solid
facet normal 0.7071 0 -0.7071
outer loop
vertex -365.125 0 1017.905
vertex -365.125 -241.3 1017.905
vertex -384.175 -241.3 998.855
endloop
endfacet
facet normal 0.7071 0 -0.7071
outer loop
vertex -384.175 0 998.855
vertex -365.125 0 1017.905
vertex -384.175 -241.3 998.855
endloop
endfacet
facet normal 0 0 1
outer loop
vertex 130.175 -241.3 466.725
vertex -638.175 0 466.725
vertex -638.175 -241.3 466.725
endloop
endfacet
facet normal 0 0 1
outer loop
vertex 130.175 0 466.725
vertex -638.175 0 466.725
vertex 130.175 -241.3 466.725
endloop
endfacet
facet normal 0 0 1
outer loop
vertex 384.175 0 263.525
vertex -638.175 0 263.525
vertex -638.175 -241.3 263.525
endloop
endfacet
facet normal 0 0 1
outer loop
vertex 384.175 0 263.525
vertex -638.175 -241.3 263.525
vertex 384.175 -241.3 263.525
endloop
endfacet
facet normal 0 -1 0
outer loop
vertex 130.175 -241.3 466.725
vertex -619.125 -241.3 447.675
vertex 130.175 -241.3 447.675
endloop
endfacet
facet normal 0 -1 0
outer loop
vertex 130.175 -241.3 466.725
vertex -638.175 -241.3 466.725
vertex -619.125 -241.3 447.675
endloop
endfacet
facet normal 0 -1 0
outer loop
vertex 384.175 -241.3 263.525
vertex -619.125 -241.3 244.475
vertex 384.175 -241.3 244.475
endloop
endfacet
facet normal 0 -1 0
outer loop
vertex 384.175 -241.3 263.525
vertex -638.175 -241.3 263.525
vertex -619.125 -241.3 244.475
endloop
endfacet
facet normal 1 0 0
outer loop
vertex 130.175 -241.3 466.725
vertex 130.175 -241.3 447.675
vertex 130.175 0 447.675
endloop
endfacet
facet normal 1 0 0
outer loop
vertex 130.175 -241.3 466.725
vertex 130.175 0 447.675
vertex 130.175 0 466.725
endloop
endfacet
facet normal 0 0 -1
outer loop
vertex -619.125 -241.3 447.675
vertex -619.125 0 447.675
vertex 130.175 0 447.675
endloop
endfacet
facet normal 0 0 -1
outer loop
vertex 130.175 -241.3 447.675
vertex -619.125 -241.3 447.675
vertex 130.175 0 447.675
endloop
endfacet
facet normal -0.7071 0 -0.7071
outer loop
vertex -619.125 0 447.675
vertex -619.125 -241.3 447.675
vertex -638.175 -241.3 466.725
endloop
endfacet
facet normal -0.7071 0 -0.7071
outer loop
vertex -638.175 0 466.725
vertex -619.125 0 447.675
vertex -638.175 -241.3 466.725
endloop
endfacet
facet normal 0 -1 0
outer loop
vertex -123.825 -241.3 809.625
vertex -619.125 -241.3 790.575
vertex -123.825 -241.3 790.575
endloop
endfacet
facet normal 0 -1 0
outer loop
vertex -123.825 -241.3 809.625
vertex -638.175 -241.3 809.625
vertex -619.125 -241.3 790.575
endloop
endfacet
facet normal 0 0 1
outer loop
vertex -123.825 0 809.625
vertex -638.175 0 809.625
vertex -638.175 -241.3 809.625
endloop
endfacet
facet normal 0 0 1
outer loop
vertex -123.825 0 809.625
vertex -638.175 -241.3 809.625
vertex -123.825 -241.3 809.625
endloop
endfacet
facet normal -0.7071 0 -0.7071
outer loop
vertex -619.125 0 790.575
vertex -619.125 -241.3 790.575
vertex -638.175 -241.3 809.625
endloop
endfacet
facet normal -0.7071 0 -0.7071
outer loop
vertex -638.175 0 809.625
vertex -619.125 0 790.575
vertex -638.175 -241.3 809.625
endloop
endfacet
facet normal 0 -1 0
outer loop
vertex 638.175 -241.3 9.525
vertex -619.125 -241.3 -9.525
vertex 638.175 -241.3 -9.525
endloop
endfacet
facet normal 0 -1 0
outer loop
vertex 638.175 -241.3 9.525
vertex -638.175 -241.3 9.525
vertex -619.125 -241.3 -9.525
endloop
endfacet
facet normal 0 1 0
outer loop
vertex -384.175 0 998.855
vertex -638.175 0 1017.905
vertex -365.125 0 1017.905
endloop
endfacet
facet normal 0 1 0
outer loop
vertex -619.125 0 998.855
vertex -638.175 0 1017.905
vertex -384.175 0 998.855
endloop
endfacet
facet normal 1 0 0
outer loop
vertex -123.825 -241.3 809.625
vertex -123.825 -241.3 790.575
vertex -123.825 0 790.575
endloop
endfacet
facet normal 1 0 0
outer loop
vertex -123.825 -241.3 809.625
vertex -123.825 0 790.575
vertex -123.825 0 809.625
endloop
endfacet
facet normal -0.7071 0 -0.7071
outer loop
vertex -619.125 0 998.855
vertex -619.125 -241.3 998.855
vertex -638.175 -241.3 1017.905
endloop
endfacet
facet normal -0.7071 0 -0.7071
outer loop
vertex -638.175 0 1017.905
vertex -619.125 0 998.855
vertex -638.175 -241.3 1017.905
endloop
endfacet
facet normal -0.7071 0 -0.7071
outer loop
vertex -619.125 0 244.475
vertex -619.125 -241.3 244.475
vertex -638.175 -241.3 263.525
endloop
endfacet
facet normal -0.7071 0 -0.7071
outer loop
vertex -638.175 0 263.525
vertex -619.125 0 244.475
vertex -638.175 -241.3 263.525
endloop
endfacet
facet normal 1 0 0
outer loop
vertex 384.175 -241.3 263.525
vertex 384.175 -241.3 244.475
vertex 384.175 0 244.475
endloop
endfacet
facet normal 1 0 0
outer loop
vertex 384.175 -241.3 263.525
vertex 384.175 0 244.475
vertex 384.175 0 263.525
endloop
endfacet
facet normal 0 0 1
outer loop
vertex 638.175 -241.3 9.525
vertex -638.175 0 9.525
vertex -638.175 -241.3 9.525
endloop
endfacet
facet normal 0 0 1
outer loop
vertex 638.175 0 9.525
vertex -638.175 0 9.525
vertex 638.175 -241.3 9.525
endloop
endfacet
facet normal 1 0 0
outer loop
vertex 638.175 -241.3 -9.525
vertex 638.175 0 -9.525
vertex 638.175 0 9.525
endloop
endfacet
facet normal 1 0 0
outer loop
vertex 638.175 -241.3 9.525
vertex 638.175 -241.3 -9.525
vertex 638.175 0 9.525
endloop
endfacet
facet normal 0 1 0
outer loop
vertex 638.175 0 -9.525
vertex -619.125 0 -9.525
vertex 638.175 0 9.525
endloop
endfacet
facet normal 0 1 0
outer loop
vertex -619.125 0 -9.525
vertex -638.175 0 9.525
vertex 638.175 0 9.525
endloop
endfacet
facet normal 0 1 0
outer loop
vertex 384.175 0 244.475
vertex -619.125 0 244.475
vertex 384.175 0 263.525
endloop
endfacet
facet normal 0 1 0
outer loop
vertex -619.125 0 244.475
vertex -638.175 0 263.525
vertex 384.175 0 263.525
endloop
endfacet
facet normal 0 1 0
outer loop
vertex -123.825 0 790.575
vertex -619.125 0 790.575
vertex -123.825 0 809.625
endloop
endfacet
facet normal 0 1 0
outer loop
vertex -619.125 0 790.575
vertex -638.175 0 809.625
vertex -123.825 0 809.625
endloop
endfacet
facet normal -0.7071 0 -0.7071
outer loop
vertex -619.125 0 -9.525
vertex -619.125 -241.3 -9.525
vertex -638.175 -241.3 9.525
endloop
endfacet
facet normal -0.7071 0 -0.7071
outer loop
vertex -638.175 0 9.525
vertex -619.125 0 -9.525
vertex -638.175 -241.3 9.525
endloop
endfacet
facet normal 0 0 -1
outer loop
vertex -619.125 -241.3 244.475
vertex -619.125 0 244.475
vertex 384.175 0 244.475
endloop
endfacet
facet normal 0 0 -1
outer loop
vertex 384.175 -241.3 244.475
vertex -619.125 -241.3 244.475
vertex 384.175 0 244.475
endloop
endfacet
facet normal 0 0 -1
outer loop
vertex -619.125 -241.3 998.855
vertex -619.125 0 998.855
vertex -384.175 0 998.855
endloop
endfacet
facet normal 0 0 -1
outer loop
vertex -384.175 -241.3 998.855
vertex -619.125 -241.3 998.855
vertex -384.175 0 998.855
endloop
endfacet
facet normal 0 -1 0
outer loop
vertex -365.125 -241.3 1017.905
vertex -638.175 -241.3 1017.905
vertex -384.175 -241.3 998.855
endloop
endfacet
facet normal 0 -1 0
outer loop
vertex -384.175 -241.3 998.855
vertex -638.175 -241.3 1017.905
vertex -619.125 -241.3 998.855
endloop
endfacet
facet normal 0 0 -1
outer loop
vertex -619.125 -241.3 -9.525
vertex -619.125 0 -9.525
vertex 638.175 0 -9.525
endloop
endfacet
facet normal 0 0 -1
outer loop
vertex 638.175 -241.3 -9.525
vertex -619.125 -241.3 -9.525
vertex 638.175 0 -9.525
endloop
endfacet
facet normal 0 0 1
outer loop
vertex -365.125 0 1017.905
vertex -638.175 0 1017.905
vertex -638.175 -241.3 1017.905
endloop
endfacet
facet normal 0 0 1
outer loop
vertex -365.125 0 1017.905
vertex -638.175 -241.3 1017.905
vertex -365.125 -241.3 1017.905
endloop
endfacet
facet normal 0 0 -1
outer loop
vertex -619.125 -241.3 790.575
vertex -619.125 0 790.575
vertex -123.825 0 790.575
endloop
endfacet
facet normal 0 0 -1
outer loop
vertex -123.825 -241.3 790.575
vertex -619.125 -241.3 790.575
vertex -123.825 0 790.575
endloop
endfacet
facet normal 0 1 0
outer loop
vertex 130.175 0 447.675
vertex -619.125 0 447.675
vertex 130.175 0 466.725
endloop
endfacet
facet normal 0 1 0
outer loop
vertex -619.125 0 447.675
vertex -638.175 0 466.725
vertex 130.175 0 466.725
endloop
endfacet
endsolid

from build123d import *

# Parameters (mm, degrees)
F0_W      = 1276.35
F0_H      = 19.05
F1_DEPTH  = 241.3
F3_DEPTH  = 241.301
F5_W      = 254
F5_H      = 19.05
F6_DEPTH  = 241.301
F8_W      = 254
F8_H      = 19.05
F9_DEPTH  = 241.301
F11_W     = 254
F11_H     = 19.05
F12_DEPTH = 241.301
F15_DEPTH = 241.301


with BuildPart() as f1:
    # F0 (on Front) → F1 (new body)
    with BuildSketch(Plane.XZ):
        Rectangle(F0_W, F0_H)
    extrude(amount=F1_DEPTH)

    # F2 (on face) → F3 (cut, through all)
    with BuildSketch(Plane.XZ.offset(241.3)):
        Polygon((-619.125, -9.525), (-638.175, 9.525), (-638.175, -9.525), align=None)
    extrude(amount=-F3_DEPTH, mode=Mode.SUBTRACT)


with BuildPart() as f4_1:
    # F4: copy of F1
    add(f1.part.moved(Location((0, 0, 254))))

    # F5 (on face) → F6 (cut, through all)
    with BuildSketch(Plane.XZ.offset(241.3)):
        with Locations((511.175, 254)):
            Rectangle(F5_W, F5_H)
    extrude(amount=-F6_DEPTH, mode=Mode.SUBTRACT)


with BuildPart() as f7_1:
    # F7: copy of F4_1
    add(f4_1.part.moved(Location((0, 0, 203.2))))

    # F8 (on face) → F9 (cut, through all)
    with BuildSketch(Plane.XZ.offset(241.3)):
        with Locations((257.175, 457.2)):
            Rectangle(F8_W, F8_H)
    extrude(amount=-F9_DEPTH, mode=Mode.SUBTRACT)


with BuildPart() as f10_1:
    # F10: copy of F7_1
    add(f7_1.part.moved(Location((0, 0, 342.9))))

    # F11 (on face) → F12 (cut, through all)
    with BuildSketch(Plane.XZ.offset(241.3)):
        with Locations((3.175, 800.1)):
            Rectangle(F11_W, F11_H)
    extrude(amount=-F12_DEPTH, mode=Mode.SUBTRACT)


with BuildPart() as f13_1:
    # F13: copy of F10_1
    add(f10_1.part.moved(Location((0, 0, 208.28))))

    # F14 (on face) → F15 (cut, through all)
    with BuildSketch(Plane.XZ.offset(241.3)):
        Polygon((-365.125, 1017.905), (-384.175, 998.855), (-123.825, 998.855), (-123.825, 1017.905), align=None)
    extrude(amount=-F15_DEPTH, mode=Mode.SUBTRACT)


solid = Compound([f1.part, f4_1.part, f7_1.part, f10_1.part, f13_1.part])
